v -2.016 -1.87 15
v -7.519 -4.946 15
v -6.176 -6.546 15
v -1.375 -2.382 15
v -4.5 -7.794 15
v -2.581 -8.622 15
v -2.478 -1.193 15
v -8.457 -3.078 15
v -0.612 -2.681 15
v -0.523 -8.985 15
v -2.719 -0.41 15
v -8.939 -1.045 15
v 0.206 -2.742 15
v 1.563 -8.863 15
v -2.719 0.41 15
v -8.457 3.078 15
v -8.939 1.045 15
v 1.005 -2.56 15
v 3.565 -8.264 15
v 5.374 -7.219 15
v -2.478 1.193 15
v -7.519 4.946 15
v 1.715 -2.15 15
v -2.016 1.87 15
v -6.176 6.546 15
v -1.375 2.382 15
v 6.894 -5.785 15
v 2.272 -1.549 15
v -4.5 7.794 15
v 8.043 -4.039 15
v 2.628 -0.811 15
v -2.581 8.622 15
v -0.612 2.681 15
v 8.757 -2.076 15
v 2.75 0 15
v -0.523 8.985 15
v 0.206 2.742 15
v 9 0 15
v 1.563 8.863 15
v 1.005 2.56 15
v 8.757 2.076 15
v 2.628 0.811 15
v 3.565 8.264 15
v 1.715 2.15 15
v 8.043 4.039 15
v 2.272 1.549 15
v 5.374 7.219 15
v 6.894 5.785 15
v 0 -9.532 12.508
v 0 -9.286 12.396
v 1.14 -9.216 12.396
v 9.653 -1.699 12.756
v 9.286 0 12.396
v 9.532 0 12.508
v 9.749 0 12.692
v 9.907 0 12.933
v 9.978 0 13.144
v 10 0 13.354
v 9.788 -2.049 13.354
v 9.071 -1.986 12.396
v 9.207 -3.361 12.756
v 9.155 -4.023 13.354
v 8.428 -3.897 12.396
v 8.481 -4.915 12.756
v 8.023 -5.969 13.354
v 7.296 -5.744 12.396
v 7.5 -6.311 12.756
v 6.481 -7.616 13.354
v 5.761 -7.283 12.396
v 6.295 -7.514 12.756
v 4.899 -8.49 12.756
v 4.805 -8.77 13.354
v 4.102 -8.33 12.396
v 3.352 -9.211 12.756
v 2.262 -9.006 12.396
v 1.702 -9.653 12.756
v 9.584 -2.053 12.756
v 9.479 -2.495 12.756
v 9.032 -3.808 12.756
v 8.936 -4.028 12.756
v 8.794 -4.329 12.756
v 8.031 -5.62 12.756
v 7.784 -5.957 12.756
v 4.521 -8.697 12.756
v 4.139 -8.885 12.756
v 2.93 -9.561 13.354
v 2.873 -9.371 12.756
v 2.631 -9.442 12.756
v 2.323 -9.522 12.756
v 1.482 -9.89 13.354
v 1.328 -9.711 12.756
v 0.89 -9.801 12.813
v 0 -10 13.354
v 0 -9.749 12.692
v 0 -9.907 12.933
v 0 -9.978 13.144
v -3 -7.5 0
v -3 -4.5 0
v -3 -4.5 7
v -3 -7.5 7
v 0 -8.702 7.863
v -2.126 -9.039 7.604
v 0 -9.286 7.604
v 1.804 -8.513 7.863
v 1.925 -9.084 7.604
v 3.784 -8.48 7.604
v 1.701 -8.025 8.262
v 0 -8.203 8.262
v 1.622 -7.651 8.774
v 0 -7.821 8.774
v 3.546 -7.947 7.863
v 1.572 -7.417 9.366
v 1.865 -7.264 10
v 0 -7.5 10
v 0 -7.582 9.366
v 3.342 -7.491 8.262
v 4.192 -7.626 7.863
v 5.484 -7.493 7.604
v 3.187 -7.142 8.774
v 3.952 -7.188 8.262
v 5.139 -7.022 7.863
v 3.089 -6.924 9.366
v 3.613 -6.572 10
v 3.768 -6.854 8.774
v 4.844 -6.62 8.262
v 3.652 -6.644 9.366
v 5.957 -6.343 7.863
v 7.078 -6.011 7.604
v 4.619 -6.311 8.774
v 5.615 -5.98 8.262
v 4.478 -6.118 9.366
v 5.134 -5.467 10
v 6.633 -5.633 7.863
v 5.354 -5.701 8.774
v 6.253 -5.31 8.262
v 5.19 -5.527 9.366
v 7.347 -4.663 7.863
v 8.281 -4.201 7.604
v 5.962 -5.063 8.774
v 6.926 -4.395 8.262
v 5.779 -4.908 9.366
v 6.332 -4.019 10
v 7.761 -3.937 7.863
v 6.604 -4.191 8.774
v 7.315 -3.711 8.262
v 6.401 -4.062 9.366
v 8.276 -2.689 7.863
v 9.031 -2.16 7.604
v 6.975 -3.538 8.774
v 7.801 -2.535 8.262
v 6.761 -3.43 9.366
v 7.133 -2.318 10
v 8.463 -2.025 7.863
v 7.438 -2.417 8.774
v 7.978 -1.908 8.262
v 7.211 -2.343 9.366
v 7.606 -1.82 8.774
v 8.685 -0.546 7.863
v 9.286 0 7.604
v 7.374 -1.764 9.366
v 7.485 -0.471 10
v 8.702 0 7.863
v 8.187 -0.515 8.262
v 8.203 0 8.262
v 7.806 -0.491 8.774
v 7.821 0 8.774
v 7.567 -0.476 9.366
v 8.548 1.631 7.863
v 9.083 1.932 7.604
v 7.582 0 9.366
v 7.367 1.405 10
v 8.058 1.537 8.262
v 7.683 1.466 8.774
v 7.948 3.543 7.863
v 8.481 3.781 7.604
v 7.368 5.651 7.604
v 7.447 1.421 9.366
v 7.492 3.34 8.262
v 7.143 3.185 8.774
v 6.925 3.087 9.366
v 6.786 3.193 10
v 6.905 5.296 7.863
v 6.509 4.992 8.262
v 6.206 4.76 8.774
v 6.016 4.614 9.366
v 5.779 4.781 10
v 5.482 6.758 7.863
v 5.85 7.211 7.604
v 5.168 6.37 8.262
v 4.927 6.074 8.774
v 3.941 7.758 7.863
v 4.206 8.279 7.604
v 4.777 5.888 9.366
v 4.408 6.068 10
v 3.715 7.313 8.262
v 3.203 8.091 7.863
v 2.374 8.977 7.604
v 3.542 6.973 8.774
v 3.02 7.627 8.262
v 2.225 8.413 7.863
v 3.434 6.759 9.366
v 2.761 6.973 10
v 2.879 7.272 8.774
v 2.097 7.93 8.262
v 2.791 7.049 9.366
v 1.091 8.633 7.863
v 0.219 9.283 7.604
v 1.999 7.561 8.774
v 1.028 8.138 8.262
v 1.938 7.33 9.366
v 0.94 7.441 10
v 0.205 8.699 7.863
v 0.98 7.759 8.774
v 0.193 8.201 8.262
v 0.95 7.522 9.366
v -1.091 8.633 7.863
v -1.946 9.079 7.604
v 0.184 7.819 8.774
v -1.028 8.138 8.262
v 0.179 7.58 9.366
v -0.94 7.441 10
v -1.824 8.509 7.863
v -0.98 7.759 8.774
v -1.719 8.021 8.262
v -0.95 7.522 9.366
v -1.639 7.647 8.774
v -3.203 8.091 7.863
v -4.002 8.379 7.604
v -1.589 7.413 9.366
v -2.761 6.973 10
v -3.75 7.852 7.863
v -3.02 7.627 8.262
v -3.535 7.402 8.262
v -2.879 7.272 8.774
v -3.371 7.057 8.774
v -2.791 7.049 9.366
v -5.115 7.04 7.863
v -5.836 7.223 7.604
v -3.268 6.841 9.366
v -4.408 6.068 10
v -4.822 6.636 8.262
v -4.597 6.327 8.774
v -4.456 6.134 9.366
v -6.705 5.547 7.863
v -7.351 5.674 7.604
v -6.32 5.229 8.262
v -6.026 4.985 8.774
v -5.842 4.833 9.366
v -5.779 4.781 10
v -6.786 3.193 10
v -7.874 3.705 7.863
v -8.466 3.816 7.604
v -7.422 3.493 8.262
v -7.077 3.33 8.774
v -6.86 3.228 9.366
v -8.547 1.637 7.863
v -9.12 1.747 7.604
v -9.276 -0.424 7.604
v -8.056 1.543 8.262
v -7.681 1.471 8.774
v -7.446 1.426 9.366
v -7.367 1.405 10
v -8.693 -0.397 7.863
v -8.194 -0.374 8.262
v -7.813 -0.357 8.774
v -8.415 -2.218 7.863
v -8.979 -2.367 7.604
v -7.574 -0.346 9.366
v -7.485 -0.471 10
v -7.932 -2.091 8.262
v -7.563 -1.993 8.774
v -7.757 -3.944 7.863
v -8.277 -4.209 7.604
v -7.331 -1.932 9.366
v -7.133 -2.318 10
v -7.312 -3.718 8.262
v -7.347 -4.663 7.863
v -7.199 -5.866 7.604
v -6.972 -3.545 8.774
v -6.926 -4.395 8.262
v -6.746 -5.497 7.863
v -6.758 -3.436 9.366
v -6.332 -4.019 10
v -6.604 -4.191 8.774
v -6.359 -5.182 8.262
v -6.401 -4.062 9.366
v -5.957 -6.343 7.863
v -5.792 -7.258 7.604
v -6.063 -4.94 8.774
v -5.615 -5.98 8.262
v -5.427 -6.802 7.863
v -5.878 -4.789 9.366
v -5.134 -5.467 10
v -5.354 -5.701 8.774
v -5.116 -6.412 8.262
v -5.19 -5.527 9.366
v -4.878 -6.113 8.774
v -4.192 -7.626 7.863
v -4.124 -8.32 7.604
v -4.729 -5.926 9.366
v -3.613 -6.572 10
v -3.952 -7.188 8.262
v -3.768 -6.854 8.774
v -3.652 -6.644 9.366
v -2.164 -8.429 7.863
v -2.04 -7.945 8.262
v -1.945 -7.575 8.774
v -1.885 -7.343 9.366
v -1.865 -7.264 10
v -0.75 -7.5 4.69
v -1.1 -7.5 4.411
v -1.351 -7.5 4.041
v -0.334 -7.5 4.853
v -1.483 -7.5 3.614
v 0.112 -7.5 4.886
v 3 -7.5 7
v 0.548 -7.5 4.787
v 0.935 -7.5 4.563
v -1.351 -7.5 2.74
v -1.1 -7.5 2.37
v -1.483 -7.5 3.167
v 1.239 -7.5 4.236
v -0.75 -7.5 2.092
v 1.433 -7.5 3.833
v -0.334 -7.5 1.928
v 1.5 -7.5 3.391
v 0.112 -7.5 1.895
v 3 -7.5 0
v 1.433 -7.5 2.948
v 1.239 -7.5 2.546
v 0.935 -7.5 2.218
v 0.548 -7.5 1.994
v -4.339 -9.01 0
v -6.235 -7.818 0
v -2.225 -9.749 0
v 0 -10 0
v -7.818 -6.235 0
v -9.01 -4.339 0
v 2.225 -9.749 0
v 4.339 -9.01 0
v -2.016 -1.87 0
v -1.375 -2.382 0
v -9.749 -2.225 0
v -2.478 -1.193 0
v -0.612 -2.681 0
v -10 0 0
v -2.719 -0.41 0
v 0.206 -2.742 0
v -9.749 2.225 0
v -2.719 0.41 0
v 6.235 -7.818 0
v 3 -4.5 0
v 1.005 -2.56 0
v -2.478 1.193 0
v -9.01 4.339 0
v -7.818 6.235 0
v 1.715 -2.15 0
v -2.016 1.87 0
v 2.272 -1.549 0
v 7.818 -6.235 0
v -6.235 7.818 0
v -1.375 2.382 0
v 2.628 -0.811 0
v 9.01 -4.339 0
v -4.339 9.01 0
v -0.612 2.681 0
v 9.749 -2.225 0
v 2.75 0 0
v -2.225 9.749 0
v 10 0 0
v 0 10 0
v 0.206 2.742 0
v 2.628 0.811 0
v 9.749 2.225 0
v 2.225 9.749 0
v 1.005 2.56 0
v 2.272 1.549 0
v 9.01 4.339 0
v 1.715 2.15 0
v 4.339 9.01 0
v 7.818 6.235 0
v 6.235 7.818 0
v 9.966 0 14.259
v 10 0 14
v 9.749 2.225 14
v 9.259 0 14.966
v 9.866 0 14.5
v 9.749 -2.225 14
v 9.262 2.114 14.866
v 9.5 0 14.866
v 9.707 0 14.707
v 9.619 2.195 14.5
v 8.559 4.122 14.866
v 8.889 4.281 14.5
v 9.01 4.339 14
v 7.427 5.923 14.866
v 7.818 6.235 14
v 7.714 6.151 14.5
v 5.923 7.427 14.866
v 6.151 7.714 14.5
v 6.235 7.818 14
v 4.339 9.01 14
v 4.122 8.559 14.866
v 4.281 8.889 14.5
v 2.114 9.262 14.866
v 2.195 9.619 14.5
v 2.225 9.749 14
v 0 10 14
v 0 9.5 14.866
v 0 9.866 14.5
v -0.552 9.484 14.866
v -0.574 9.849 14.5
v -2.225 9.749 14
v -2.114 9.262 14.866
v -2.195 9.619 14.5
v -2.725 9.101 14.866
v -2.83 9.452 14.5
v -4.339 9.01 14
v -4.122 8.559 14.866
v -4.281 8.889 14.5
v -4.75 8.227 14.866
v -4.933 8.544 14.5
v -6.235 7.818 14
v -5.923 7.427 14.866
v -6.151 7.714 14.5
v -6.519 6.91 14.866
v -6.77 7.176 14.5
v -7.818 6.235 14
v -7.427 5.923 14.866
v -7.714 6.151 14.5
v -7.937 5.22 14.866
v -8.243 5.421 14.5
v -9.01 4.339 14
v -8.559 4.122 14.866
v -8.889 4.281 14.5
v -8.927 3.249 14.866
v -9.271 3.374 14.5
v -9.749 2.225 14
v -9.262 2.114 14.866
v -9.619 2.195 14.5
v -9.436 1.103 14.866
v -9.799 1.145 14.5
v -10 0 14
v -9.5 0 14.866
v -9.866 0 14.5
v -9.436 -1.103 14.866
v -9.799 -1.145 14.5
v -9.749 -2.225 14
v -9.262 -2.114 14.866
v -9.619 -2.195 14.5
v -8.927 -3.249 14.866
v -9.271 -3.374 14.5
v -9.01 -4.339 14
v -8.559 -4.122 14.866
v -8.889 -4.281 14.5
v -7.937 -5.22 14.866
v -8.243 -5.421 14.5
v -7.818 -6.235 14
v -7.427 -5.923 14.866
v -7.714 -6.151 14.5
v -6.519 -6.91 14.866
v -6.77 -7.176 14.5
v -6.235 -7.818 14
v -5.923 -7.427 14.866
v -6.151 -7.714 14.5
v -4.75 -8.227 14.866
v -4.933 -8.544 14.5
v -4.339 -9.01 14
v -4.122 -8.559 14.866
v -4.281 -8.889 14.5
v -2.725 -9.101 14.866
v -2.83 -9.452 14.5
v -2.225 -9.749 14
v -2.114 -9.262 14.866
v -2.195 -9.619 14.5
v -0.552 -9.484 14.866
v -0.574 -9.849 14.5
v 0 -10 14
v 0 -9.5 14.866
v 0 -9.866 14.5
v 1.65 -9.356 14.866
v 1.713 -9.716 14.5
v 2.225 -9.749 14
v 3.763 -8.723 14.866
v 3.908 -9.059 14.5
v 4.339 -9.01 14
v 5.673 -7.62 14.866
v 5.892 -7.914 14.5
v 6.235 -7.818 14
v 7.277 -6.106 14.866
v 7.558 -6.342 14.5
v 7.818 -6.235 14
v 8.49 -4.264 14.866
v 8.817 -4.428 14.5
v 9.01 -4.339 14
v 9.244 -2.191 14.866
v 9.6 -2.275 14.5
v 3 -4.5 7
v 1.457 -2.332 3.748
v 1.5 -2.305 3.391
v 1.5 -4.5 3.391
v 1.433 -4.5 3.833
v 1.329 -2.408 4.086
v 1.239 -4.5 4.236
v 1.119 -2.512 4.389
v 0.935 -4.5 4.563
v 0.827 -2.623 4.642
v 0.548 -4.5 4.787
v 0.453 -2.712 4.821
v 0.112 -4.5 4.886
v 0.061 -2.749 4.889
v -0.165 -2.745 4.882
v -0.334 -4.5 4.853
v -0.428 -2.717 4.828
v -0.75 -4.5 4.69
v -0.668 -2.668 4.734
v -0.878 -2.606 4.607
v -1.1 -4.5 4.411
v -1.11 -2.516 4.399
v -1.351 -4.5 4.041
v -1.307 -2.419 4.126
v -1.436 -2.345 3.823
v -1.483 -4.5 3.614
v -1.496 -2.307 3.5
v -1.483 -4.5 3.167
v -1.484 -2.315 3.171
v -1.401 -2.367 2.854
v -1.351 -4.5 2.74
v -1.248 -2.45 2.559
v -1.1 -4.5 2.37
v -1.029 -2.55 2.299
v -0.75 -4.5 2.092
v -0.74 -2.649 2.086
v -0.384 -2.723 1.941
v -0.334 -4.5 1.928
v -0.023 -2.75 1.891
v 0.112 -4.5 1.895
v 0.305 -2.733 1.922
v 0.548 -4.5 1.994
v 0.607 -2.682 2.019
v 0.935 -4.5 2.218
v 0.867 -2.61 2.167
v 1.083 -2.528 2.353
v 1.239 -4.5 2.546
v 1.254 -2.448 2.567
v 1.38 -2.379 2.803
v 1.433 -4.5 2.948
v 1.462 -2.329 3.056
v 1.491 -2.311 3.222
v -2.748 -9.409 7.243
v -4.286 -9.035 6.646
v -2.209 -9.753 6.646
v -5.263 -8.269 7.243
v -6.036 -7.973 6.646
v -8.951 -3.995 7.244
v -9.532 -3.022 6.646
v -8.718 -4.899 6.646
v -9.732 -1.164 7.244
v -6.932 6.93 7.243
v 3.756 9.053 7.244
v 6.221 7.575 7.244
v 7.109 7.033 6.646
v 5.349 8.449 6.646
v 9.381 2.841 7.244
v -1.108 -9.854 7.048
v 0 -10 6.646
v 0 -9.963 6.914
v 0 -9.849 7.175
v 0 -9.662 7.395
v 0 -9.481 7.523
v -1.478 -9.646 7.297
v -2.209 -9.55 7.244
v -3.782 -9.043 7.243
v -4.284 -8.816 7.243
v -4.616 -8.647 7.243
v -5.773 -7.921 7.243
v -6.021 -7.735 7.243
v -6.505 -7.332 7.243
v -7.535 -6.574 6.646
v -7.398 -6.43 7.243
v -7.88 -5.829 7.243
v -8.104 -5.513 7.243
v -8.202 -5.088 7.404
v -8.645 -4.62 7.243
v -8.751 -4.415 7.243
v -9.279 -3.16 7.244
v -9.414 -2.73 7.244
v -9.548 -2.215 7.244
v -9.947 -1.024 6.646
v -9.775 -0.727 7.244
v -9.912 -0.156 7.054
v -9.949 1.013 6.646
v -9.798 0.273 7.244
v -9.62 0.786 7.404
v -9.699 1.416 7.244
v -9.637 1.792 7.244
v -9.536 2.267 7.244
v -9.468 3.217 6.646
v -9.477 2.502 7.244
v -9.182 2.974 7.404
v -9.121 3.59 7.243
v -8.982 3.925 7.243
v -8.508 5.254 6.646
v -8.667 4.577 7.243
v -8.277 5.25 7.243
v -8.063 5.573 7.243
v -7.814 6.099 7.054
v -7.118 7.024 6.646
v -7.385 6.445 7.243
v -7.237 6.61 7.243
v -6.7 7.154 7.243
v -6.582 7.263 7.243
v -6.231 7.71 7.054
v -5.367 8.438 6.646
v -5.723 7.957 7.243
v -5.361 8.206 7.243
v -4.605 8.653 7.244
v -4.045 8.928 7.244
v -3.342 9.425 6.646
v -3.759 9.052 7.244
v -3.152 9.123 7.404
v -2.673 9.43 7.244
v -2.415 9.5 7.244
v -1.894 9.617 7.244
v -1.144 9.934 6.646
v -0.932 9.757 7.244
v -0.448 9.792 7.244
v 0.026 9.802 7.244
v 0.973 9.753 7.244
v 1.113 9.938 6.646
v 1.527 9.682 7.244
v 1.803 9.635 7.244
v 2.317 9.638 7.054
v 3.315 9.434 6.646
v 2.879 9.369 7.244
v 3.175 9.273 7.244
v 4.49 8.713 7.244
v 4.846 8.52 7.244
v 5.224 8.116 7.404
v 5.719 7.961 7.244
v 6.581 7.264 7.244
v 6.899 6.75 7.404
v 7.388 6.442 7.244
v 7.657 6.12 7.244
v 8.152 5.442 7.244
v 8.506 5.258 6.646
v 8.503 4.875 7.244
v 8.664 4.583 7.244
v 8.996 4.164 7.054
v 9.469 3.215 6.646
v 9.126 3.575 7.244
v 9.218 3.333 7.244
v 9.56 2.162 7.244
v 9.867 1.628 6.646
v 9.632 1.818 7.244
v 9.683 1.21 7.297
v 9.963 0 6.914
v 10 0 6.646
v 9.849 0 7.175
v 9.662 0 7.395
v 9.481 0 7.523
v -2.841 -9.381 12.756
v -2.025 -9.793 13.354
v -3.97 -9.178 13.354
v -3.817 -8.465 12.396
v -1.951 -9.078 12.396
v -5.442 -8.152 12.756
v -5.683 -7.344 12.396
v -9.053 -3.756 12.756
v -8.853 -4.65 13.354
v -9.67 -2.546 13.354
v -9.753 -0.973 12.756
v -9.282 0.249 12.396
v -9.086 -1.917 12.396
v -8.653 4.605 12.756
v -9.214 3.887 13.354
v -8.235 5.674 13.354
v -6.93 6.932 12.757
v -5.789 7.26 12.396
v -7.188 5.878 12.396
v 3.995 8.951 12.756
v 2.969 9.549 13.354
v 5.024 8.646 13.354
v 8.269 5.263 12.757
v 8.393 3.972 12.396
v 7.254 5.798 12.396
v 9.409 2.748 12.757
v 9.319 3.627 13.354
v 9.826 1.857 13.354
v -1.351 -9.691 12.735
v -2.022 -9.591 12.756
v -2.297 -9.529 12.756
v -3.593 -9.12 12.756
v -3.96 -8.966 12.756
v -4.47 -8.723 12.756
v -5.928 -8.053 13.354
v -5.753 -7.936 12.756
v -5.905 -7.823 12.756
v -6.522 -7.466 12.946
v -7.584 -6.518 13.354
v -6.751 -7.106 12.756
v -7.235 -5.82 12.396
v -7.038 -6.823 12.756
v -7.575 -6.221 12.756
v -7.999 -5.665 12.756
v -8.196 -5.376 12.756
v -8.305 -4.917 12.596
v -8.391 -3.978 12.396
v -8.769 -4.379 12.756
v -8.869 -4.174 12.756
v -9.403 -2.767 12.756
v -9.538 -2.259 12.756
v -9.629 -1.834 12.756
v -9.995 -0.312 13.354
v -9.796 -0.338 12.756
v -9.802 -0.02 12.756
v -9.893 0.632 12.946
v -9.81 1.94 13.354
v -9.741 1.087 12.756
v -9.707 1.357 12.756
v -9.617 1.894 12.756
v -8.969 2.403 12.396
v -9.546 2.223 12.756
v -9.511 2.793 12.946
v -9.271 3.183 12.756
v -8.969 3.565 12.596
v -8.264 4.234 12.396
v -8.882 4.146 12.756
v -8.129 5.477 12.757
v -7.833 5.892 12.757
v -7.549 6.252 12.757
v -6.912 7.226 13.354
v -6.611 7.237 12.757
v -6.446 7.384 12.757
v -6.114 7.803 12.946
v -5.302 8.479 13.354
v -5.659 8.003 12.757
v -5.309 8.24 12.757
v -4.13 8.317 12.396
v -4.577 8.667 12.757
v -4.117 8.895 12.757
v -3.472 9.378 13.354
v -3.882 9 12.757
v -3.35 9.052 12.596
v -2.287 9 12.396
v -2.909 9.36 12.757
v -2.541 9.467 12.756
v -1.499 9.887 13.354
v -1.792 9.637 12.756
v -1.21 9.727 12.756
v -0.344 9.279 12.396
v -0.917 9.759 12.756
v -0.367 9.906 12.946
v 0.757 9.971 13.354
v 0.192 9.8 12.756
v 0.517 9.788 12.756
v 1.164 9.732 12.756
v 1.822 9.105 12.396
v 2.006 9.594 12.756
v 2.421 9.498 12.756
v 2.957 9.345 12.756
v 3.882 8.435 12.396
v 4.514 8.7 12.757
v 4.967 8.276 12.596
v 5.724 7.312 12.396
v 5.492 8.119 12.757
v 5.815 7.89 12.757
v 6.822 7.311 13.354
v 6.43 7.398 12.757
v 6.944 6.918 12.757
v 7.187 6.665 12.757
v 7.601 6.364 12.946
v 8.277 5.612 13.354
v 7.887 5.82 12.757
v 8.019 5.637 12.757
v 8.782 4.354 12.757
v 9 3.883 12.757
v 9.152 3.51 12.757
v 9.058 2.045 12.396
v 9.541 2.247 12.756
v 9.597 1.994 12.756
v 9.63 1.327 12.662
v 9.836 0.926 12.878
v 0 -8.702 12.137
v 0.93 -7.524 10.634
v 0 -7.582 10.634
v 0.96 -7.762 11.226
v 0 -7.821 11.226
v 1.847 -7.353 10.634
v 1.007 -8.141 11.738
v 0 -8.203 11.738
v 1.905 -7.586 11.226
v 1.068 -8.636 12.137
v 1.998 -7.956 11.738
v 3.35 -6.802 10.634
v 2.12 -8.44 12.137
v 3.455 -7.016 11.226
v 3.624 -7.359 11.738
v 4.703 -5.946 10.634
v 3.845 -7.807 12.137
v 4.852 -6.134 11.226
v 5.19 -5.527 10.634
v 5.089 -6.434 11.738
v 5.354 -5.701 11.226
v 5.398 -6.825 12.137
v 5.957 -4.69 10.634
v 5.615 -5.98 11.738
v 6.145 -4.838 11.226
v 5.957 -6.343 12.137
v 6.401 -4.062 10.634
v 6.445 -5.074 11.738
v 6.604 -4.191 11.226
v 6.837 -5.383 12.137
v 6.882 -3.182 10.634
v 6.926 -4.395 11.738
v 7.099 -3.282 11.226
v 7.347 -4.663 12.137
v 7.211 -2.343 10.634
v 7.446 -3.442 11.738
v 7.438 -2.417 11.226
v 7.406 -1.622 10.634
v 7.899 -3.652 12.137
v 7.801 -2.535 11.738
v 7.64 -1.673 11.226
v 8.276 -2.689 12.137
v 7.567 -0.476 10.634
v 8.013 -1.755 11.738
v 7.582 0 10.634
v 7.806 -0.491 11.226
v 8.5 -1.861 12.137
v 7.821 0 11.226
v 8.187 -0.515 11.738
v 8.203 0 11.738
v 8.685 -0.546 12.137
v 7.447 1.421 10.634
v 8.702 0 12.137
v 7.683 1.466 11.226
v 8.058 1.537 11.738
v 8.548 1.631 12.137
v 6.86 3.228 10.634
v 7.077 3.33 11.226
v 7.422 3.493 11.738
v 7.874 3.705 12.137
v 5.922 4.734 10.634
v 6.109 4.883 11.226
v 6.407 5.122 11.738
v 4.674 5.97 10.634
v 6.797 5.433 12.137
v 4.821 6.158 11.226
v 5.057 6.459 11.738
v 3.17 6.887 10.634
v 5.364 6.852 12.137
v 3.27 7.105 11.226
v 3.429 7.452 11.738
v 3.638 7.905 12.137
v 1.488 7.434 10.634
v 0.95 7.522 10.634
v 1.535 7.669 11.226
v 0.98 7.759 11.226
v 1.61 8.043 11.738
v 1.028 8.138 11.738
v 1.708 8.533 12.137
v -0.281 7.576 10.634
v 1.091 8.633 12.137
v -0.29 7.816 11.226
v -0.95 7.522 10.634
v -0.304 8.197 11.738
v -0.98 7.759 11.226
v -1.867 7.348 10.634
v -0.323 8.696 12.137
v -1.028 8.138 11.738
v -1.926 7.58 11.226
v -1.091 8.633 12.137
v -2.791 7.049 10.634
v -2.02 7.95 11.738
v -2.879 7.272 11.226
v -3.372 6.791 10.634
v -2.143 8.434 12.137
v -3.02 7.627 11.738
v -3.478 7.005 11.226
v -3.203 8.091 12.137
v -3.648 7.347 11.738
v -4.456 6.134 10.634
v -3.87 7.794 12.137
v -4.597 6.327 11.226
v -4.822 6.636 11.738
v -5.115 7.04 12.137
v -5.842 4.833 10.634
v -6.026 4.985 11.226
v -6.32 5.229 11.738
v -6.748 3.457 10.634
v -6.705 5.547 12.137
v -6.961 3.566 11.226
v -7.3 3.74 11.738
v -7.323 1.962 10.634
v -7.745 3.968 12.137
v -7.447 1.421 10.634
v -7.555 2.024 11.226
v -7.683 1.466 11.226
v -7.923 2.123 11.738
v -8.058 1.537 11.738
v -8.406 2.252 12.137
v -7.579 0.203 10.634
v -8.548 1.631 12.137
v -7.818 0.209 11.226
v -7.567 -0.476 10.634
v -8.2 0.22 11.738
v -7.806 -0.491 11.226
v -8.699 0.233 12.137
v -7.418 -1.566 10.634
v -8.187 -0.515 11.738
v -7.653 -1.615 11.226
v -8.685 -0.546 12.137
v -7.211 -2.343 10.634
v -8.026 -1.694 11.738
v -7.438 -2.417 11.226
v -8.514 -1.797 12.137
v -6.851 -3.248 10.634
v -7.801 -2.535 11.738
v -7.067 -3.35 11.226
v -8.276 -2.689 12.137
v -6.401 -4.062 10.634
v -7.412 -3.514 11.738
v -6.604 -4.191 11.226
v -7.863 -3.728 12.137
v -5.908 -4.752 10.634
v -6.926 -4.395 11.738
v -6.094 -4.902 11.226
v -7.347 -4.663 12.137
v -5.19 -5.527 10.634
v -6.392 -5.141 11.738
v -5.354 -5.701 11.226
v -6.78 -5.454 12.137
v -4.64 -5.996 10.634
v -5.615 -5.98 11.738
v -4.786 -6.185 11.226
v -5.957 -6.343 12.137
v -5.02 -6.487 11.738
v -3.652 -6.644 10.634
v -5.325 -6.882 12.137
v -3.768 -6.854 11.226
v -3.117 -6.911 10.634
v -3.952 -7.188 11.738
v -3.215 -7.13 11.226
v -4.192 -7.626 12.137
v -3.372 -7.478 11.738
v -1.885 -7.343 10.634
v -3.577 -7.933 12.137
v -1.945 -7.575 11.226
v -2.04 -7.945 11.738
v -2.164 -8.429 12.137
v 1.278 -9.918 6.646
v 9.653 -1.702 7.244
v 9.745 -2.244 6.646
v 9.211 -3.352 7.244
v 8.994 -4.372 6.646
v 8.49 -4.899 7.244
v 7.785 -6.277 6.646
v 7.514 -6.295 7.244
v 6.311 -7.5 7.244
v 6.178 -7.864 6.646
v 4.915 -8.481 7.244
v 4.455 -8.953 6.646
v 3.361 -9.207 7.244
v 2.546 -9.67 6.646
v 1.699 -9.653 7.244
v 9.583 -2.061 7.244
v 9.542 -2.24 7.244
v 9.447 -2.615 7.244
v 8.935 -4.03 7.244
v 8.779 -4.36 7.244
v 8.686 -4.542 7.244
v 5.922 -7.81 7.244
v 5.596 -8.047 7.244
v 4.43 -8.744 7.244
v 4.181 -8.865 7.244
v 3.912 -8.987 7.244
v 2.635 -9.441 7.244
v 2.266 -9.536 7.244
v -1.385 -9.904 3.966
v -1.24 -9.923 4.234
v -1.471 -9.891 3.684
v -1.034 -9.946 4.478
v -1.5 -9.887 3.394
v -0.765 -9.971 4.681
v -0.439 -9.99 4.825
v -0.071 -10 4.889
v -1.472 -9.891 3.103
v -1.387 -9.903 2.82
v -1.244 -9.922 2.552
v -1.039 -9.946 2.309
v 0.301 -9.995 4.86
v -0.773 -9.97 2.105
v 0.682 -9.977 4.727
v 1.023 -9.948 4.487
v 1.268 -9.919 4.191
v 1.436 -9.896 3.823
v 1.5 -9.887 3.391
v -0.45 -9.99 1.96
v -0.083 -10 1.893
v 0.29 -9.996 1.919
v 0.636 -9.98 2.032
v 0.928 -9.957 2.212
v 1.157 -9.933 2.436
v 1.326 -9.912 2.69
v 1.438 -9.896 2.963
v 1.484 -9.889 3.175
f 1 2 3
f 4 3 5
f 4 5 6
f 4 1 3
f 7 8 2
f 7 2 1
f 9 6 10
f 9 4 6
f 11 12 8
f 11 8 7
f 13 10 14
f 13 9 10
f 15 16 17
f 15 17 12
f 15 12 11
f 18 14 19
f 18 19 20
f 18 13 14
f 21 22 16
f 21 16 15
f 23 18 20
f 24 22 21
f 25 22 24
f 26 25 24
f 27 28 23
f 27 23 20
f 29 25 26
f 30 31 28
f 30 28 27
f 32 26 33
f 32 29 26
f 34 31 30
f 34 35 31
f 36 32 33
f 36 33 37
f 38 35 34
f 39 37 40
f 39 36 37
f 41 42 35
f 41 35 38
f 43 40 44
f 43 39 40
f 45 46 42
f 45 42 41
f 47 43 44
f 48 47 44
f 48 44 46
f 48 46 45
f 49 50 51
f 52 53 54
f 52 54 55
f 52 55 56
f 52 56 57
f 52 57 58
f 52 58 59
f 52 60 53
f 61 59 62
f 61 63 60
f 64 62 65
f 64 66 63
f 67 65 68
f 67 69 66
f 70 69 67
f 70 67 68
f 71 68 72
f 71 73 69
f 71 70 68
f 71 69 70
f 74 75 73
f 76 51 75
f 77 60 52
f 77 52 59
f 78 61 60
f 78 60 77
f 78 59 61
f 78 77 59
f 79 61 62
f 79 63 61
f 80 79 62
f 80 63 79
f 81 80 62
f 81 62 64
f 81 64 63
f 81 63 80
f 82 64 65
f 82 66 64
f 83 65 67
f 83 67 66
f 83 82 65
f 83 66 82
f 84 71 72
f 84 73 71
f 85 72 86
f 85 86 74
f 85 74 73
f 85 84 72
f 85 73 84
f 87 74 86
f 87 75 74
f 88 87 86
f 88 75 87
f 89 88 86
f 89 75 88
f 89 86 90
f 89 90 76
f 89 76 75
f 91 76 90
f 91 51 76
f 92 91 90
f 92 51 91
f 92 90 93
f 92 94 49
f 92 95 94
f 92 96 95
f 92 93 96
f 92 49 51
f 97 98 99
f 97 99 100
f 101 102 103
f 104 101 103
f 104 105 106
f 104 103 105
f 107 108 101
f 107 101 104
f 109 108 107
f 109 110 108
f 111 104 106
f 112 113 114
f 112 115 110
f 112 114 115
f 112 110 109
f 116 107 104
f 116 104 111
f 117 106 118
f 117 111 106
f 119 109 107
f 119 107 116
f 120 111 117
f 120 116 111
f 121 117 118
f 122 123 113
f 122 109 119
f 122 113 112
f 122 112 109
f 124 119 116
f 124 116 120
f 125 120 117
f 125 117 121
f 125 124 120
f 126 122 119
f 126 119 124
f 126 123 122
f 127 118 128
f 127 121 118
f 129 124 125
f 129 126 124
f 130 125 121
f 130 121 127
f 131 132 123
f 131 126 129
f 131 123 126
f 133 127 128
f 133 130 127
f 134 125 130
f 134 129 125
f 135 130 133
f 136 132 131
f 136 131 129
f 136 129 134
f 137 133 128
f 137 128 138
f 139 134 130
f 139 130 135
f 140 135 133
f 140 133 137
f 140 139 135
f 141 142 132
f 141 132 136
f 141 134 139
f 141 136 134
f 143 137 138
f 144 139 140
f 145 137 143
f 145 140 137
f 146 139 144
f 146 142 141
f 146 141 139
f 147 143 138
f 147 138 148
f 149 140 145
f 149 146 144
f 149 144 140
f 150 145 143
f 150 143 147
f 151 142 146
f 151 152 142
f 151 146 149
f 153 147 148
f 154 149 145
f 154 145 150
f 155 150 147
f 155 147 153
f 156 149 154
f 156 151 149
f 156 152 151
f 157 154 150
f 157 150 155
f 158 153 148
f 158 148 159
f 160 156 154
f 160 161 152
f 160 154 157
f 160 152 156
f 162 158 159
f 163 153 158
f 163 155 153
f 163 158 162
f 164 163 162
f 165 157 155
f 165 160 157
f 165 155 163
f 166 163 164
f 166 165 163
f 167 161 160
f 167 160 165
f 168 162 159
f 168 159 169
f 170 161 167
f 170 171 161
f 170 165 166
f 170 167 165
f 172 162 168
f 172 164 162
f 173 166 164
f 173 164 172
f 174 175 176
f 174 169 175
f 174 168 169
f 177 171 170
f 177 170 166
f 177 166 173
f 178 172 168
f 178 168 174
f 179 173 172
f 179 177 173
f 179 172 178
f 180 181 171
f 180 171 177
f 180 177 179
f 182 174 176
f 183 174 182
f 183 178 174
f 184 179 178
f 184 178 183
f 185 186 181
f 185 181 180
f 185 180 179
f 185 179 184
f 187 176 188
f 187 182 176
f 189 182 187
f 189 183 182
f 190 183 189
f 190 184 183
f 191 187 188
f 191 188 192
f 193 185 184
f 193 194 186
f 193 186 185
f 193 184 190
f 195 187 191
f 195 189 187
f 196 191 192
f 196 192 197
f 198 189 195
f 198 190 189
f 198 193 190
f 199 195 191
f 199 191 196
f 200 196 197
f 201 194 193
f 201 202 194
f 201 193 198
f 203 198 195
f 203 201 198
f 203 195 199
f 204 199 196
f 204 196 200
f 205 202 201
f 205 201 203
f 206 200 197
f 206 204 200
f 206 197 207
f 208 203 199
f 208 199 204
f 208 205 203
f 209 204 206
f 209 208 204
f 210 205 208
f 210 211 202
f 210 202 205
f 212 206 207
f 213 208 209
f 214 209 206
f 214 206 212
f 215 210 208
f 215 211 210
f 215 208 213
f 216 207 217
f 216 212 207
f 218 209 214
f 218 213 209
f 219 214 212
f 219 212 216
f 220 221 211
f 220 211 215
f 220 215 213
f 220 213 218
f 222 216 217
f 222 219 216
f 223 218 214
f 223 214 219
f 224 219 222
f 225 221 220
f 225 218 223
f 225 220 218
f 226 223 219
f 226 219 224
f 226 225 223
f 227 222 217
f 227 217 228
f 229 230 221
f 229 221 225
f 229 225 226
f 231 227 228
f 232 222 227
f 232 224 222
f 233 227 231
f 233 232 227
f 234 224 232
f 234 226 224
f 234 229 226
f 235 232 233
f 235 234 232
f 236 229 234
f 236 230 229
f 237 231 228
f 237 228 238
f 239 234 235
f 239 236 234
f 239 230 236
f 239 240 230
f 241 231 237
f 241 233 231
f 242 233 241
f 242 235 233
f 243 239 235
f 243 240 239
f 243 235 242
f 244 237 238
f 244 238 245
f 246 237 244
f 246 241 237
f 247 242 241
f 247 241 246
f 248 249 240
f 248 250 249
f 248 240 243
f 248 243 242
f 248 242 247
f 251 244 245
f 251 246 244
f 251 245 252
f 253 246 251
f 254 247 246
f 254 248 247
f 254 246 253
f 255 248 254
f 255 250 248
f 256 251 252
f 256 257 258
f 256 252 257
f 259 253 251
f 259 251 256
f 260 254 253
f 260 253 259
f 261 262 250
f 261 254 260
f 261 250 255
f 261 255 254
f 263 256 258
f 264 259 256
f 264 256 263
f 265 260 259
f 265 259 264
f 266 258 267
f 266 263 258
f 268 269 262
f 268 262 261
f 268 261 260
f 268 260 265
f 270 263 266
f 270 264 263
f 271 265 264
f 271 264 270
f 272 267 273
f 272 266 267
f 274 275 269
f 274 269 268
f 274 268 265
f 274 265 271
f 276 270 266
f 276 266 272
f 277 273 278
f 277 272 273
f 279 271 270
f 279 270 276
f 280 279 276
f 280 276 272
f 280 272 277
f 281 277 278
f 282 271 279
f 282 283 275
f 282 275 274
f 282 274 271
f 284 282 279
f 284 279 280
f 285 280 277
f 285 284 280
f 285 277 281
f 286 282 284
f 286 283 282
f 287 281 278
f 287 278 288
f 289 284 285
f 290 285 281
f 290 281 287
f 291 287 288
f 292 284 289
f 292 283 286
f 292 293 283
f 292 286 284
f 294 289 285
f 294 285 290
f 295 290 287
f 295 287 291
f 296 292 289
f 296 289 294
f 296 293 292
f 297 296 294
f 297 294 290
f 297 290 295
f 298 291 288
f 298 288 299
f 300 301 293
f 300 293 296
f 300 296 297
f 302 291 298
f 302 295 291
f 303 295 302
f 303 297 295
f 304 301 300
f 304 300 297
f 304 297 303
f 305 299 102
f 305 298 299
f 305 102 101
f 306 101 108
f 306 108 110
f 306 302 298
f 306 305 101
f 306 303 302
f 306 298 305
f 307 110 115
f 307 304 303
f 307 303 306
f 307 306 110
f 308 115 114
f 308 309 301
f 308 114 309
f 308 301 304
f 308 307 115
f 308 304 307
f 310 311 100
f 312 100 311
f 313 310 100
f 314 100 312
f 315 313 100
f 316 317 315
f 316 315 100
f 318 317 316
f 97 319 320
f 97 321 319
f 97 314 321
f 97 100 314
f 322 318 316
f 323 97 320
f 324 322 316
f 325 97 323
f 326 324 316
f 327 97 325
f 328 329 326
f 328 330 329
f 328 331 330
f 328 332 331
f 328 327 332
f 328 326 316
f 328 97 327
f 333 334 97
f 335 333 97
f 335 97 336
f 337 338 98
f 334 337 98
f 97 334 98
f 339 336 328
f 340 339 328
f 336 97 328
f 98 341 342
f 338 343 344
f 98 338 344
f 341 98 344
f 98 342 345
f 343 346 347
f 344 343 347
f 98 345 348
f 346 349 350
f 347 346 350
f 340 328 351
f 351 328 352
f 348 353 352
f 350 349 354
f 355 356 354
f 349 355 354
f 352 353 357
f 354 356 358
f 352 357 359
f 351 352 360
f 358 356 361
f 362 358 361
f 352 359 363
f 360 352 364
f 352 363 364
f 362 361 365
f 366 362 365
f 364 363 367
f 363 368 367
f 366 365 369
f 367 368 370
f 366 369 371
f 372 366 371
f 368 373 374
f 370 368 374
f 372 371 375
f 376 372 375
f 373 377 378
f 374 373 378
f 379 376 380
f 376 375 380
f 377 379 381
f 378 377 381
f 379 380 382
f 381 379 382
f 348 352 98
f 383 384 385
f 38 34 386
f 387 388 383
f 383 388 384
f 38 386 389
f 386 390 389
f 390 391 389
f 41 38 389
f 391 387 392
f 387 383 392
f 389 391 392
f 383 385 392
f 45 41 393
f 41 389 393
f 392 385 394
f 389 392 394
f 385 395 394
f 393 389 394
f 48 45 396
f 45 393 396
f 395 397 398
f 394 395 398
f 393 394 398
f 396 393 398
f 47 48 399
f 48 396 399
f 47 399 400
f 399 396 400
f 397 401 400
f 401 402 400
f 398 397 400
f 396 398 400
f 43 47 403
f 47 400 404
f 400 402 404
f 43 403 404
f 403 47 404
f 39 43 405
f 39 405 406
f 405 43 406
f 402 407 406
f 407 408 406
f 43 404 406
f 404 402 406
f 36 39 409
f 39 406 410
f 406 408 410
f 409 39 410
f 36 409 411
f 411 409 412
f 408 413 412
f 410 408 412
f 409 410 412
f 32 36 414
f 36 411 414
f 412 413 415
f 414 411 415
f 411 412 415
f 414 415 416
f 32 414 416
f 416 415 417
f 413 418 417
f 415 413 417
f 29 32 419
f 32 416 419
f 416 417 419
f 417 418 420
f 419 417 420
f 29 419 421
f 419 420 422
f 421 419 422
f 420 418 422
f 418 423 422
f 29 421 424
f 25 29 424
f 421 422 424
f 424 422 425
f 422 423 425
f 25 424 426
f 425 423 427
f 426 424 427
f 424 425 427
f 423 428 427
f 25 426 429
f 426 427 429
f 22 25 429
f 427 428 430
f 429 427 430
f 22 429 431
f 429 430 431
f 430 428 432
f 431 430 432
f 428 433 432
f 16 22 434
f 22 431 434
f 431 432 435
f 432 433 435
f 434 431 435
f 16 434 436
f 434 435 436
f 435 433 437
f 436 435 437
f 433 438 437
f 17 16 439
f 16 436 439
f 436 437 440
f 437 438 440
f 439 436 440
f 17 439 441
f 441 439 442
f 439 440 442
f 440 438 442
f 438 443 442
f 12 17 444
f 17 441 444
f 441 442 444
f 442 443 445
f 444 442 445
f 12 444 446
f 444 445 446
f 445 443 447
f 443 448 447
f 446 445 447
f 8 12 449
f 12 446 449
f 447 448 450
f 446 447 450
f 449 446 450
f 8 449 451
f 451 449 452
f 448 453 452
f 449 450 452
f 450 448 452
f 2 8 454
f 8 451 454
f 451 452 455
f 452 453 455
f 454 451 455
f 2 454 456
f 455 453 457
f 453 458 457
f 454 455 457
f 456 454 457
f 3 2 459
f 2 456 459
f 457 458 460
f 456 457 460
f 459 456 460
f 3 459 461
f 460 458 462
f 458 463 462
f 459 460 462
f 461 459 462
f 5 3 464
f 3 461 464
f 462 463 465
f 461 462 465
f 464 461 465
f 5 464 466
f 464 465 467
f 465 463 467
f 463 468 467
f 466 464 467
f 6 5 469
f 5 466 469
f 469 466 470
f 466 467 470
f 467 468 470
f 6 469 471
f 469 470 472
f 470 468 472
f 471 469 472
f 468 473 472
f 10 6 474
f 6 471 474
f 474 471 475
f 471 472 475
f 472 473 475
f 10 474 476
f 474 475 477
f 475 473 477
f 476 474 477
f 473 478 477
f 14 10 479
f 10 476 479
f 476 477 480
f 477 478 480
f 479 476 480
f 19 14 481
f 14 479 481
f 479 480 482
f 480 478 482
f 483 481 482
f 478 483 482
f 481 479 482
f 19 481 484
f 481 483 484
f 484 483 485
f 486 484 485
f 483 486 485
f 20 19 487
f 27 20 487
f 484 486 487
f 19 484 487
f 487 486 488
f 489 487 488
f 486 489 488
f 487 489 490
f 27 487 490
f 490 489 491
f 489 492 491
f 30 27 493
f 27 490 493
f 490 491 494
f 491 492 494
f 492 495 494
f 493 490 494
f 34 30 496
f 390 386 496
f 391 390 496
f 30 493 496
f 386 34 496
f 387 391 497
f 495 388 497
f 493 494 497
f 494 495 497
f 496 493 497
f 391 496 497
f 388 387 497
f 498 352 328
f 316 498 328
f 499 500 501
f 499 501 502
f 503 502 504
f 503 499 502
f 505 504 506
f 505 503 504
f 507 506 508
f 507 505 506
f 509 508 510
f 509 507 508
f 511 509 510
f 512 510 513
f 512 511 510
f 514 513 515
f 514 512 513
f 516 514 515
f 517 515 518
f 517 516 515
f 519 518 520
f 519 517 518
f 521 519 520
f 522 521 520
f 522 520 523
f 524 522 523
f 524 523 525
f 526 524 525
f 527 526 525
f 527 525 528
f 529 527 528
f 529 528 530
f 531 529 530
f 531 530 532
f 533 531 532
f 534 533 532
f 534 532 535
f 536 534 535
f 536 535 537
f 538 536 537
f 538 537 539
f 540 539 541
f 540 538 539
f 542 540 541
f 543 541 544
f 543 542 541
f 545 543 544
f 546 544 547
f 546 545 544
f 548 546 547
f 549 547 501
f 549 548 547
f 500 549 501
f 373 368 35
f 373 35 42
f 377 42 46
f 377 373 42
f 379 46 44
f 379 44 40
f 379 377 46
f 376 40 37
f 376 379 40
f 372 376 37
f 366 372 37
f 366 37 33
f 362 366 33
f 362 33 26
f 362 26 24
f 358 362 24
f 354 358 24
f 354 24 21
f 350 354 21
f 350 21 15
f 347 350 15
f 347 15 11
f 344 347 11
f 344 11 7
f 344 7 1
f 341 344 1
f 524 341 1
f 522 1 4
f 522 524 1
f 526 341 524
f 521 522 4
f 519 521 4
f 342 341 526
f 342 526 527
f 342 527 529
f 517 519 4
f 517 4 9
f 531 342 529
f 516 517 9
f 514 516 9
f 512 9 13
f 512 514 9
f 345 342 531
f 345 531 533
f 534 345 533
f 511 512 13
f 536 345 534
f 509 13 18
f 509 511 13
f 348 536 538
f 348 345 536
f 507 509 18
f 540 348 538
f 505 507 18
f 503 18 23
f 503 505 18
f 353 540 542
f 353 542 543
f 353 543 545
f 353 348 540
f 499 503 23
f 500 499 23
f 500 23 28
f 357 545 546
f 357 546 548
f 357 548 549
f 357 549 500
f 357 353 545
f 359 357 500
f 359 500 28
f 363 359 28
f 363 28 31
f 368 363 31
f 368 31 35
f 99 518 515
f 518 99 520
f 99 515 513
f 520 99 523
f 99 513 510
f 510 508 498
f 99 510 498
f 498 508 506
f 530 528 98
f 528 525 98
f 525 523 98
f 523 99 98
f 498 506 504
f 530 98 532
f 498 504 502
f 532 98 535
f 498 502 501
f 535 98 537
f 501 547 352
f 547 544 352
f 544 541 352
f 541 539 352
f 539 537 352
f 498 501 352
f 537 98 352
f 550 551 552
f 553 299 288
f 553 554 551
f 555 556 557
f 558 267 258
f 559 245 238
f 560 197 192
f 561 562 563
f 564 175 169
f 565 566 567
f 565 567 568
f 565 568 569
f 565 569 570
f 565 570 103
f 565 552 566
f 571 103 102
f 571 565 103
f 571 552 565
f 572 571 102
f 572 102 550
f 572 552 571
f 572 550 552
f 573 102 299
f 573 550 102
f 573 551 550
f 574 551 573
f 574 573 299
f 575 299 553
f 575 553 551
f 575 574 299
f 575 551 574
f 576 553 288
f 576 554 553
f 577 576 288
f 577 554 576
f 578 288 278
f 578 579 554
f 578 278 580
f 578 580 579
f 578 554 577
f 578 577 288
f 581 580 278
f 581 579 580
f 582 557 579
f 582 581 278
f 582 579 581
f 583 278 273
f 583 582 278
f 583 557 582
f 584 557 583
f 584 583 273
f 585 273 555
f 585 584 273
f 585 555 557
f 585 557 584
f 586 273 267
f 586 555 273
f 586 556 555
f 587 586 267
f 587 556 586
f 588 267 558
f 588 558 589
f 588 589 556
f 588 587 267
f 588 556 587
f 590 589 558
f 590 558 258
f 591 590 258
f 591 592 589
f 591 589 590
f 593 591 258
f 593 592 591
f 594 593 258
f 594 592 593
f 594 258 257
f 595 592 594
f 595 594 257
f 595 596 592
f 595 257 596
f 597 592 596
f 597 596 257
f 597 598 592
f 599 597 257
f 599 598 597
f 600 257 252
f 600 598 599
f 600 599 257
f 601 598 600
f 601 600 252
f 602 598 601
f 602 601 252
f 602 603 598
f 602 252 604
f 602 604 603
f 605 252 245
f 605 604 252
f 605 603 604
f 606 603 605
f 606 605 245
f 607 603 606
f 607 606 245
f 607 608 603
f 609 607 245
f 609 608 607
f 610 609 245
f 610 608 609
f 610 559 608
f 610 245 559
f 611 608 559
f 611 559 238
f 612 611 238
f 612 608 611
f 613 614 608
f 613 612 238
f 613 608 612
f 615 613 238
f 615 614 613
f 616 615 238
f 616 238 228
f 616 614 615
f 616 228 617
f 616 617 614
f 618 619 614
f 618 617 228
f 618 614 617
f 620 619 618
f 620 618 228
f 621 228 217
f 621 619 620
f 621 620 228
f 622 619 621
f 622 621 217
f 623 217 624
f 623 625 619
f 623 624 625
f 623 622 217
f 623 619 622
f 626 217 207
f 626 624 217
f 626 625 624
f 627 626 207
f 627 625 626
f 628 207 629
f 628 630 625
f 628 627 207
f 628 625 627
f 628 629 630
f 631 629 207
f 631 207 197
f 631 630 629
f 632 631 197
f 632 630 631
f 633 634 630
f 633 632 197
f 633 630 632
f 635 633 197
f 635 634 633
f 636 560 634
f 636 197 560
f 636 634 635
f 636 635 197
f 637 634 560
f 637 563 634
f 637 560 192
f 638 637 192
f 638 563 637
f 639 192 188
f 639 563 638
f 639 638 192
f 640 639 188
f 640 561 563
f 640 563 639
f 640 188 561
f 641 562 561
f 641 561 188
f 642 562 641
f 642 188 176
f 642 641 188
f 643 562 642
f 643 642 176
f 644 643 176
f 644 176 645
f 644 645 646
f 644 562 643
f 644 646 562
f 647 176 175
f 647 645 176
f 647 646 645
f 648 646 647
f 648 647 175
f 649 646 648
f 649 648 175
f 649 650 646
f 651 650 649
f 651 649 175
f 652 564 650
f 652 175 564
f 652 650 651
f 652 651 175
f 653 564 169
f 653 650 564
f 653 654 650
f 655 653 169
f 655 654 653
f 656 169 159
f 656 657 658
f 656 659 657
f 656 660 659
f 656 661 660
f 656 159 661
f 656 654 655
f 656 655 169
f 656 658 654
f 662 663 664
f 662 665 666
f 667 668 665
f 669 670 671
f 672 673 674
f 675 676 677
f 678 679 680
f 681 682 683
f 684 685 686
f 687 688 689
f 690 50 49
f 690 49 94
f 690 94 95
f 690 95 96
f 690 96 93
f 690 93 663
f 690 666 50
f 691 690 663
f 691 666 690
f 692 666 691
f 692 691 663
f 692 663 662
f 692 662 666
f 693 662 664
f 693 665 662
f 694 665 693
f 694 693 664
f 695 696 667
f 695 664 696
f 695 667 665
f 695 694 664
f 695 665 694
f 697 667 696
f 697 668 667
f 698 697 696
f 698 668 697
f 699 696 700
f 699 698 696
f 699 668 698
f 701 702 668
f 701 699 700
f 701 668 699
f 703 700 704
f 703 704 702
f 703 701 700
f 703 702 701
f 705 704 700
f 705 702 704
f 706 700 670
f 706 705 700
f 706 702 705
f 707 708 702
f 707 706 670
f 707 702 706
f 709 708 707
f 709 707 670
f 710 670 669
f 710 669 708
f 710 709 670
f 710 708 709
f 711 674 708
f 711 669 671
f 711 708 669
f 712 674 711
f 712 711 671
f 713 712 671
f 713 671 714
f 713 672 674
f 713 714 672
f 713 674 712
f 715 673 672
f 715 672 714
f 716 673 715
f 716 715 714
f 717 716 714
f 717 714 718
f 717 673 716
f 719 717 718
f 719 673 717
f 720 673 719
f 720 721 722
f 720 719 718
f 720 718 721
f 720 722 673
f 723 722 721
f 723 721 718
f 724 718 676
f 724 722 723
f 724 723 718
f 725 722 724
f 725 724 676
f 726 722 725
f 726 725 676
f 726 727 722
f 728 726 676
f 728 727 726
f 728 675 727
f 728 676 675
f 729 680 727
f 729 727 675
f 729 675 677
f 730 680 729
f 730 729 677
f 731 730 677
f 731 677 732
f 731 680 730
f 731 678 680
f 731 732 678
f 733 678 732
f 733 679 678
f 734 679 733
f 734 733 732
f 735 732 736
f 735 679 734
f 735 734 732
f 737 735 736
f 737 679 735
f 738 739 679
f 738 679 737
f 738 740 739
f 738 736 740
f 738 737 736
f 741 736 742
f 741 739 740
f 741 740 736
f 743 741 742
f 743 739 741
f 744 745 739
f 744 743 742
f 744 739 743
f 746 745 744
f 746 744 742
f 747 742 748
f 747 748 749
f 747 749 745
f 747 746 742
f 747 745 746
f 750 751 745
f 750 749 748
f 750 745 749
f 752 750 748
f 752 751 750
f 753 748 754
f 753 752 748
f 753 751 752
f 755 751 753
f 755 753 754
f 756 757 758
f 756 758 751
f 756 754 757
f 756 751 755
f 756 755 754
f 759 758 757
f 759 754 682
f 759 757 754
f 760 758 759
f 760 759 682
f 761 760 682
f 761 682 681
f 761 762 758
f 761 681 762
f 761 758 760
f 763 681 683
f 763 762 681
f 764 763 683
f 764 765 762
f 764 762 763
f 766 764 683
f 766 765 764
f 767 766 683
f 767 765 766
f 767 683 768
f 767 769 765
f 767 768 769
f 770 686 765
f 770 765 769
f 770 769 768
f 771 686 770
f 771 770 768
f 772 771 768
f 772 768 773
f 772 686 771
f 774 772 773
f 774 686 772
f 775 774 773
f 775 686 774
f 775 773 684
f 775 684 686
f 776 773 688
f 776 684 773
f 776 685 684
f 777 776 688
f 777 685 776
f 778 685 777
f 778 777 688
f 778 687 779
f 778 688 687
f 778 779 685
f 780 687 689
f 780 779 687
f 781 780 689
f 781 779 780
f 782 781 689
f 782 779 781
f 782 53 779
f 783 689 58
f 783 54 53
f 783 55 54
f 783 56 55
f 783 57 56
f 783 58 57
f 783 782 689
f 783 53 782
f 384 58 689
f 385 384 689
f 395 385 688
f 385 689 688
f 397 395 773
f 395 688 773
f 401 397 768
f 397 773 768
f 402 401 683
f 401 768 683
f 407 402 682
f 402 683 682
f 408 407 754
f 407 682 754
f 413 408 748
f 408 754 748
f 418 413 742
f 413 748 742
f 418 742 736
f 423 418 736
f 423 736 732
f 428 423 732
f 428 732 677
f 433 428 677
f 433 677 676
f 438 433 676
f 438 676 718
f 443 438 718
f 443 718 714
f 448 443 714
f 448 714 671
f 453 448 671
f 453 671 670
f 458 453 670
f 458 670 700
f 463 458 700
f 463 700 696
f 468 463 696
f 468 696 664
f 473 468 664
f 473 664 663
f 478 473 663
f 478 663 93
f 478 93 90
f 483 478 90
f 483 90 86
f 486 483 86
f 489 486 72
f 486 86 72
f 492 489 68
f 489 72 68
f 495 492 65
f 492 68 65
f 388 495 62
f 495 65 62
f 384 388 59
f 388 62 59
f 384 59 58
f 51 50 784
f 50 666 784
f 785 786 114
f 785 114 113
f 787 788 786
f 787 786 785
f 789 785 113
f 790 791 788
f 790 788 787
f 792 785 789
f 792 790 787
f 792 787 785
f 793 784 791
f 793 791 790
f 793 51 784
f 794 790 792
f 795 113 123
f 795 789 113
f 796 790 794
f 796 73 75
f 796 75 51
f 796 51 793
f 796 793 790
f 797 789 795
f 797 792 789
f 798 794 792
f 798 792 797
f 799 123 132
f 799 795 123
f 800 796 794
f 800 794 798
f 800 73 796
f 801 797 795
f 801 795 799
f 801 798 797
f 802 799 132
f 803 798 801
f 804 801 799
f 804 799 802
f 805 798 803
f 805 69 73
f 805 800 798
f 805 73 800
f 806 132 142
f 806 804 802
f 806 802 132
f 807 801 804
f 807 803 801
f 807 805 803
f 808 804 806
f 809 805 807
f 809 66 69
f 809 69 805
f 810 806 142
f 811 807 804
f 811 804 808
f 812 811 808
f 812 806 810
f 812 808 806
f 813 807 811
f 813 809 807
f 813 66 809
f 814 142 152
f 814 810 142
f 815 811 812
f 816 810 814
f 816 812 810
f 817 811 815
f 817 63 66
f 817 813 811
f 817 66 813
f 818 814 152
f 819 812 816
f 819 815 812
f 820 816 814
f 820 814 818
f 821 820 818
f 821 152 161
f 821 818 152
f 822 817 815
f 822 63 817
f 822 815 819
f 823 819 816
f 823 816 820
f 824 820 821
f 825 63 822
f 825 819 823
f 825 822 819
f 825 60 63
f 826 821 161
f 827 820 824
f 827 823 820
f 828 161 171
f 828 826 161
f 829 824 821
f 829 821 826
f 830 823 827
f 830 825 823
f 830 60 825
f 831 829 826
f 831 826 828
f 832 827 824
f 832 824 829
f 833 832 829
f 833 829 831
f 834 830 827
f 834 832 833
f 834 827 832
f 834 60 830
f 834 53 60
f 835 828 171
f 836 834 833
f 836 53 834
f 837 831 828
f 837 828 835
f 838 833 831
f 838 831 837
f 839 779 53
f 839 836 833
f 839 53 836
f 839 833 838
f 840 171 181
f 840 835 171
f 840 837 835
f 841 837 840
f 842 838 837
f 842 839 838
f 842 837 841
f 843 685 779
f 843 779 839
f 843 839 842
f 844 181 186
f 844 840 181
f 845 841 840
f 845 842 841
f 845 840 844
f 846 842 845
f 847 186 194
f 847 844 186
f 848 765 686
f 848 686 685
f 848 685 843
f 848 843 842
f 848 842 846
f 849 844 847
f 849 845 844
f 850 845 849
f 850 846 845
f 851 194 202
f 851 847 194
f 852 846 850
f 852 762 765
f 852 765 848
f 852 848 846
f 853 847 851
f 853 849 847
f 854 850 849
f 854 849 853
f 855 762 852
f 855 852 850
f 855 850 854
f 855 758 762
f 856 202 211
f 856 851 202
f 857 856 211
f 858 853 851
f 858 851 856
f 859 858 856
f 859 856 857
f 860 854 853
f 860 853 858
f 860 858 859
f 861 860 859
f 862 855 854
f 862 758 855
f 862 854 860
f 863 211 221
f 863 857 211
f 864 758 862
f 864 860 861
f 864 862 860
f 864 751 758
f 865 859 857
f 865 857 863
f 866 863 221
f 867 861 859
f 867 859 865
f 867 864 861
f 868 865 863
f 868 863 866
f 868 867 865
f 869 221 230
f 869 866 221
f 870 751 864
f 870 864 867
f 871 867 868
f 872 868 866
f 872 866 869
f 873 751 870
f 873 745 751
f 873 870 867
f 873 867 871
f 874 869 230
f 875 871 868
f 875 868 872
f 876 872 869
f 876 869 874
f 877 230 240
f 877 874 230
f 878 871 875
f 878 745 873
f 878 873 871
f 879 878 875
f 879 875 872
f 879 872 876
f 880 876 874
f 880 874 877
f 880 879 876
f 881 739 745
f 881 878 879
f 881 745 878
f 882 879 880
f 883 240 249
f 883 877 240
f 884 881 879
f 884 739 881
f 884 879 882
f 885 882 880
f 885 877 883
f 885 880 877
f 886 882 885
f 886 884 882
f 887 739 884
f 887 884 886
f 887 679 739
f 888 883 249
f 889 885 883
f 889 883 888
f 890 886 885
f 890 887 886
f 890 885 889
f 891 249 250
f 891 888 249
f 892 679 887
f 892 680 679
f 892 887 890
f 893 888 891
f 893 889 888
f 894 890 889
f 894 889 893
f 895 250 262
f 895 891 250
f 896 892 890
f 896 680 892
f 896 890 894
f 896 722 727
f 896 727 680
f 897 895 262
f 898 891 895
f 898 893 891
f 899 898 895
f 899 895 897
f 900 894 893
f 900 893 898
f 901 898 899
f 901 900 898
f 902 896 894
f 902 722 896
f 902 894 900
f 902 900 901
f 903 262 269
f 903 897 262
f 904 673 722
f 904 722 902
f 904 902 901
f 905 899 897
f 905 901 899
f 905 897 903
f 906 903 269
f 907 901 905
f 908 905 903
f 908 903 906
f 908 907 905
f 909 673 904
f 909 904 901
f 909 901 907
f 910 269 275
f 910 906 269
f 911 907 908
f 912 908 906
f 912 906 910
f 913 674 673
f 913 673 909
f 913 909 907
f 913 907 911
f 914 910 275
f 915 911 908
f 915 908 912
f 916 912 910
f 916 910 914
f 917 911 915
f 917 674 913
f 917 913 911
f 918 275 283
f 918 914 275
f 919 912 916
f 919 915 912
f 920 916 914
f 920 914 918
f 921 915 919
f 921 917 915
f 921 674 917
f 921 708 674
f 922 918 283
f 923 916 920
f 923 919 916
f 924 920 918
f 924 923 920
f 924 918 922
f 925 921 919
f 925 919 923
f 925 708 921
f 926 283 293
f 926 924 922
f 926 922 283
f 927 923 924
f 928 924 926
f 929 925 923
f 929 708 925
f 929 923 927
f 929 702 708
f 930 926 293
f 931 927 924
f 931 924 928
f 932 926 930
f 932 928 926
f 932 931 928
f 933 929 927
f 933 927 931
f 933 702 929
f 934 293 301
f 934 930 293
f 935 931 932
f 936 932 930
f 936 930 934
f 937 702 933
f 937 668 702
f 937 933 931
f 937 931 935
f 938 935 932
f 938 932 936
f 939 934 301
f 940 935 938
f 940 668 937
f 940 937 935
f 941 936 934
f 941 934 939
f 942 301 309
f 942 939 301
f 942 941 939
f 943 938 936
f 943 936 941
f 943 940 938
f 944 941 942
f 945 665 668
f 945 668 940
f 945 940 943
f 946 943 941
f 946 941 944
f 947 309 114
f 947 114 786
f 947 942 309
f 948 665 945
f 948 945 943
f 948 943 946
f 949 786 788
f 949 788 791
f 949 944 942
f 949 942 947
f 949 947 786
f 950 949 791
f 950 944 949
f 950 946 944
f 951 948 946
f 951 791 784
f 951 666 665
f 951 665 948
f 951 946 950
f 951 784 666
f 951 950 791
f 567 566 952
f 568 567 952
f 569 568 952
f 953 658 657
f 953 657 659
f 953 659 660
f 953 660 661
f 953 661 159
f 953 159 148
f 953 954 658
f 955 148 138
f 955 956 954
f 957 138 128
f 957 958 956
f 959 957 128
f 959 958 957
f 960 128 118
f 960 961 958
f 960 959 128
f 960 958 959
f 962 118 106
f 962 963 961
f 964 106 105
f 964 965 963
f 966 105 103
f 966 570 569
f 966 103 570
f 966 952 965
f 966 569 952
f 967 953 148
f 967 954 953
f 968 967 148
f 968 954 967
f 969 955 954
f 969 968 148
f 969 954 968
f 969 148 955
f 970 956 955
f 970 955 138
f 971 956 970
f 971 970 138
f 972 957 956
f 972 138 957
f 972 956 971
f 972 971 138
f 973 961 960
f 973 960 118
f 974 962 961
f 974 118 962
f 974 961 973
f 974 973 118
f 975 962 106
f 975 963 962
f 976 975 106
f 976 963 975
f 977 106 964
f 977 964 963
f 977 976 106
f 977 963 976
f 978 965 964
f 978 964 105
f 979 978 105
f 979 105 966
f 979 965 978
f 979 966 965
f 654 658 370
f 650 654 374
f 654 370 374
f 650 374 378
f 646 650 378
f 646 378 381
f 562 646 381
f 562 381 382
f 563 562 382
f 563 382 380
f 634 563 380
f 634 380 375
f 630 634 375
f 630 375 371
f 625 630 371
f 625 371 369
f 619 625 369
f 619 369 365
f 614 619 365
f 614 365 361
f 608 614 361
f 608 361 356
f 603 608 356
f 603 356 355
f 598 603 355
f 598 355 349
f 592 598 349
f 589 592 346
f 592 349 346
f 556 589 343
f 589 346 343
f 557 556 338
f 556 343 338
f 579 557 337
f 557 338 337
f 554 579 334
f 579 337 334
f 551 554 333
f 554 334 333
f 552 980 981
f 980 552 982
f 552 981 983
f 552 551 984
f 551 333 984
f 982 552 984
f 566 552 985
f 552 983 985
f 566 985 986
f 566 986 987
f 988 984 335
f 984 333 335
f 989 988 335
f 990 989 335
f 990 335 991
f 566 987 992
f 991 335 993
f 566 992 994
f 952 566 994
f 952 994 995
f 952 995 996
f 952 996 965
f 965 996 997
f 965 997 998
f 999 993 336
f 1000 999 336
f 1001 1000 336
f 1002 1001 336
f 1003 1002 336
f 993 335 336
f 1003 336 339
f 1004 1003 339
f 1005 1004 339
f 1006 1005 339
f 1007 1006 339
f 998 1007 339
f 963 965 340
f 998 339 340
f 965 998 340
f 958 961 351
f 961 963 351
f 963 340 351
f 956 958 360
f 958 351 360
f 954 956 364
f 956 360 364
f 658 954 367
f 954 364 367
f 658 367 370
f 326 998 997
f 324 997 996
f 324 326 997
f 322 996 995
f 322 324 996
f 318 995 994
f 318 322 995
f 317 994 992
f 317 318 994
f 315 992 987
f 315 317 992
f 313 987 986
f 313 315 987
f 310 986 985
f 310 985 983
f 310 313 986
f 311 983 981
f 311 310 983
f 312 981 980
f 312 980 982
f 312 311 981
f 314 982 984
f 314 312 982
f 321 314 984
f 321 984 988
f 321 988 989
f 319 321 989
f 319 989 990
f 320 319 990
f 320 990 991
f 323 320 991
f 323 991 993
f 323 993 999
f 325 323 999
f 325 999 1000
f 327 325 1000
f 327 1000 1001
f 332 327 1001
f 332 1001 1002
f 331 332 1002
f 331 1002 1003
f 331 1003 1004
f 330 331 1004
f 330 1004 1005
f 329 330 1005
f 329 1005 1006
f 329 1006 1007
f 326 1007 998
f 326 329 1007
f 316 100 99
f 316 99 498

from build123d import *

# Parameters (mm, degrees)
F0_R     = 10
F0_R_2   = 2.75
F1_DEPTH = 15
F2_R     = 2.5
F4_R     = 1
F5_R     = 1.5
F6_DEPTH = 25
F7_W     = 6
F7_H     = 3
F8_DEPTH = 7


with BuildPart() as f1:
    # F0 (on Top) → F1 (new body)
    with BuildSketch(Plane.XY):
        Circle(F0_R)
        Circle(F0_R_2, mode=Mode.SUBTRACT)
    extrude(amount=F1_DEPTH)

    # F2 (on Right) → F3 (revolve, cut)
    with BuildSketch(Plane.YZ):
        with Locations((-10, 10)):
            Circle(F2_R)
    revolve(axis=Axis((0, 0, 15), (0, 0, 1)), mode=Mode.SUBTRACT)

    # F4
    f4_edges = [f1.edges().sort_by_distance(p)[0] for p in [
        (7.071068, -7.071068, 7.5),
        (-7.071068, 7.071068, 7.5),
        (-7.071068, 7.071068, 12.5),
        (7.071068, -7.071068, 12.5),
        (-10, 0, 15),
    ]]
    fillet(f4_edges, radius=F4_R)

    # F5 (on Front) → F6 (cut)
    with BuildSketch(Plane.XZ):
        with Locations((0, 3.3906230694)):
            Circle(F5_R)
    extrude(amount=F6_DEPTH, mode=Mode.SUBTRACT)

    # F7 (on face) → F8 (cut)
    with BuildSketch(Plane(origin=(0, 0, 0), x_dir=(1, 0, 0), z_dir=(0, 0, -1))):
        with Locations((0, 6)):
            Rectangle(F7_W, F7_H)
    extrude(amount=-F8_DEPTH, mode=Mode.SUBTRACT)


solid = f1.part
